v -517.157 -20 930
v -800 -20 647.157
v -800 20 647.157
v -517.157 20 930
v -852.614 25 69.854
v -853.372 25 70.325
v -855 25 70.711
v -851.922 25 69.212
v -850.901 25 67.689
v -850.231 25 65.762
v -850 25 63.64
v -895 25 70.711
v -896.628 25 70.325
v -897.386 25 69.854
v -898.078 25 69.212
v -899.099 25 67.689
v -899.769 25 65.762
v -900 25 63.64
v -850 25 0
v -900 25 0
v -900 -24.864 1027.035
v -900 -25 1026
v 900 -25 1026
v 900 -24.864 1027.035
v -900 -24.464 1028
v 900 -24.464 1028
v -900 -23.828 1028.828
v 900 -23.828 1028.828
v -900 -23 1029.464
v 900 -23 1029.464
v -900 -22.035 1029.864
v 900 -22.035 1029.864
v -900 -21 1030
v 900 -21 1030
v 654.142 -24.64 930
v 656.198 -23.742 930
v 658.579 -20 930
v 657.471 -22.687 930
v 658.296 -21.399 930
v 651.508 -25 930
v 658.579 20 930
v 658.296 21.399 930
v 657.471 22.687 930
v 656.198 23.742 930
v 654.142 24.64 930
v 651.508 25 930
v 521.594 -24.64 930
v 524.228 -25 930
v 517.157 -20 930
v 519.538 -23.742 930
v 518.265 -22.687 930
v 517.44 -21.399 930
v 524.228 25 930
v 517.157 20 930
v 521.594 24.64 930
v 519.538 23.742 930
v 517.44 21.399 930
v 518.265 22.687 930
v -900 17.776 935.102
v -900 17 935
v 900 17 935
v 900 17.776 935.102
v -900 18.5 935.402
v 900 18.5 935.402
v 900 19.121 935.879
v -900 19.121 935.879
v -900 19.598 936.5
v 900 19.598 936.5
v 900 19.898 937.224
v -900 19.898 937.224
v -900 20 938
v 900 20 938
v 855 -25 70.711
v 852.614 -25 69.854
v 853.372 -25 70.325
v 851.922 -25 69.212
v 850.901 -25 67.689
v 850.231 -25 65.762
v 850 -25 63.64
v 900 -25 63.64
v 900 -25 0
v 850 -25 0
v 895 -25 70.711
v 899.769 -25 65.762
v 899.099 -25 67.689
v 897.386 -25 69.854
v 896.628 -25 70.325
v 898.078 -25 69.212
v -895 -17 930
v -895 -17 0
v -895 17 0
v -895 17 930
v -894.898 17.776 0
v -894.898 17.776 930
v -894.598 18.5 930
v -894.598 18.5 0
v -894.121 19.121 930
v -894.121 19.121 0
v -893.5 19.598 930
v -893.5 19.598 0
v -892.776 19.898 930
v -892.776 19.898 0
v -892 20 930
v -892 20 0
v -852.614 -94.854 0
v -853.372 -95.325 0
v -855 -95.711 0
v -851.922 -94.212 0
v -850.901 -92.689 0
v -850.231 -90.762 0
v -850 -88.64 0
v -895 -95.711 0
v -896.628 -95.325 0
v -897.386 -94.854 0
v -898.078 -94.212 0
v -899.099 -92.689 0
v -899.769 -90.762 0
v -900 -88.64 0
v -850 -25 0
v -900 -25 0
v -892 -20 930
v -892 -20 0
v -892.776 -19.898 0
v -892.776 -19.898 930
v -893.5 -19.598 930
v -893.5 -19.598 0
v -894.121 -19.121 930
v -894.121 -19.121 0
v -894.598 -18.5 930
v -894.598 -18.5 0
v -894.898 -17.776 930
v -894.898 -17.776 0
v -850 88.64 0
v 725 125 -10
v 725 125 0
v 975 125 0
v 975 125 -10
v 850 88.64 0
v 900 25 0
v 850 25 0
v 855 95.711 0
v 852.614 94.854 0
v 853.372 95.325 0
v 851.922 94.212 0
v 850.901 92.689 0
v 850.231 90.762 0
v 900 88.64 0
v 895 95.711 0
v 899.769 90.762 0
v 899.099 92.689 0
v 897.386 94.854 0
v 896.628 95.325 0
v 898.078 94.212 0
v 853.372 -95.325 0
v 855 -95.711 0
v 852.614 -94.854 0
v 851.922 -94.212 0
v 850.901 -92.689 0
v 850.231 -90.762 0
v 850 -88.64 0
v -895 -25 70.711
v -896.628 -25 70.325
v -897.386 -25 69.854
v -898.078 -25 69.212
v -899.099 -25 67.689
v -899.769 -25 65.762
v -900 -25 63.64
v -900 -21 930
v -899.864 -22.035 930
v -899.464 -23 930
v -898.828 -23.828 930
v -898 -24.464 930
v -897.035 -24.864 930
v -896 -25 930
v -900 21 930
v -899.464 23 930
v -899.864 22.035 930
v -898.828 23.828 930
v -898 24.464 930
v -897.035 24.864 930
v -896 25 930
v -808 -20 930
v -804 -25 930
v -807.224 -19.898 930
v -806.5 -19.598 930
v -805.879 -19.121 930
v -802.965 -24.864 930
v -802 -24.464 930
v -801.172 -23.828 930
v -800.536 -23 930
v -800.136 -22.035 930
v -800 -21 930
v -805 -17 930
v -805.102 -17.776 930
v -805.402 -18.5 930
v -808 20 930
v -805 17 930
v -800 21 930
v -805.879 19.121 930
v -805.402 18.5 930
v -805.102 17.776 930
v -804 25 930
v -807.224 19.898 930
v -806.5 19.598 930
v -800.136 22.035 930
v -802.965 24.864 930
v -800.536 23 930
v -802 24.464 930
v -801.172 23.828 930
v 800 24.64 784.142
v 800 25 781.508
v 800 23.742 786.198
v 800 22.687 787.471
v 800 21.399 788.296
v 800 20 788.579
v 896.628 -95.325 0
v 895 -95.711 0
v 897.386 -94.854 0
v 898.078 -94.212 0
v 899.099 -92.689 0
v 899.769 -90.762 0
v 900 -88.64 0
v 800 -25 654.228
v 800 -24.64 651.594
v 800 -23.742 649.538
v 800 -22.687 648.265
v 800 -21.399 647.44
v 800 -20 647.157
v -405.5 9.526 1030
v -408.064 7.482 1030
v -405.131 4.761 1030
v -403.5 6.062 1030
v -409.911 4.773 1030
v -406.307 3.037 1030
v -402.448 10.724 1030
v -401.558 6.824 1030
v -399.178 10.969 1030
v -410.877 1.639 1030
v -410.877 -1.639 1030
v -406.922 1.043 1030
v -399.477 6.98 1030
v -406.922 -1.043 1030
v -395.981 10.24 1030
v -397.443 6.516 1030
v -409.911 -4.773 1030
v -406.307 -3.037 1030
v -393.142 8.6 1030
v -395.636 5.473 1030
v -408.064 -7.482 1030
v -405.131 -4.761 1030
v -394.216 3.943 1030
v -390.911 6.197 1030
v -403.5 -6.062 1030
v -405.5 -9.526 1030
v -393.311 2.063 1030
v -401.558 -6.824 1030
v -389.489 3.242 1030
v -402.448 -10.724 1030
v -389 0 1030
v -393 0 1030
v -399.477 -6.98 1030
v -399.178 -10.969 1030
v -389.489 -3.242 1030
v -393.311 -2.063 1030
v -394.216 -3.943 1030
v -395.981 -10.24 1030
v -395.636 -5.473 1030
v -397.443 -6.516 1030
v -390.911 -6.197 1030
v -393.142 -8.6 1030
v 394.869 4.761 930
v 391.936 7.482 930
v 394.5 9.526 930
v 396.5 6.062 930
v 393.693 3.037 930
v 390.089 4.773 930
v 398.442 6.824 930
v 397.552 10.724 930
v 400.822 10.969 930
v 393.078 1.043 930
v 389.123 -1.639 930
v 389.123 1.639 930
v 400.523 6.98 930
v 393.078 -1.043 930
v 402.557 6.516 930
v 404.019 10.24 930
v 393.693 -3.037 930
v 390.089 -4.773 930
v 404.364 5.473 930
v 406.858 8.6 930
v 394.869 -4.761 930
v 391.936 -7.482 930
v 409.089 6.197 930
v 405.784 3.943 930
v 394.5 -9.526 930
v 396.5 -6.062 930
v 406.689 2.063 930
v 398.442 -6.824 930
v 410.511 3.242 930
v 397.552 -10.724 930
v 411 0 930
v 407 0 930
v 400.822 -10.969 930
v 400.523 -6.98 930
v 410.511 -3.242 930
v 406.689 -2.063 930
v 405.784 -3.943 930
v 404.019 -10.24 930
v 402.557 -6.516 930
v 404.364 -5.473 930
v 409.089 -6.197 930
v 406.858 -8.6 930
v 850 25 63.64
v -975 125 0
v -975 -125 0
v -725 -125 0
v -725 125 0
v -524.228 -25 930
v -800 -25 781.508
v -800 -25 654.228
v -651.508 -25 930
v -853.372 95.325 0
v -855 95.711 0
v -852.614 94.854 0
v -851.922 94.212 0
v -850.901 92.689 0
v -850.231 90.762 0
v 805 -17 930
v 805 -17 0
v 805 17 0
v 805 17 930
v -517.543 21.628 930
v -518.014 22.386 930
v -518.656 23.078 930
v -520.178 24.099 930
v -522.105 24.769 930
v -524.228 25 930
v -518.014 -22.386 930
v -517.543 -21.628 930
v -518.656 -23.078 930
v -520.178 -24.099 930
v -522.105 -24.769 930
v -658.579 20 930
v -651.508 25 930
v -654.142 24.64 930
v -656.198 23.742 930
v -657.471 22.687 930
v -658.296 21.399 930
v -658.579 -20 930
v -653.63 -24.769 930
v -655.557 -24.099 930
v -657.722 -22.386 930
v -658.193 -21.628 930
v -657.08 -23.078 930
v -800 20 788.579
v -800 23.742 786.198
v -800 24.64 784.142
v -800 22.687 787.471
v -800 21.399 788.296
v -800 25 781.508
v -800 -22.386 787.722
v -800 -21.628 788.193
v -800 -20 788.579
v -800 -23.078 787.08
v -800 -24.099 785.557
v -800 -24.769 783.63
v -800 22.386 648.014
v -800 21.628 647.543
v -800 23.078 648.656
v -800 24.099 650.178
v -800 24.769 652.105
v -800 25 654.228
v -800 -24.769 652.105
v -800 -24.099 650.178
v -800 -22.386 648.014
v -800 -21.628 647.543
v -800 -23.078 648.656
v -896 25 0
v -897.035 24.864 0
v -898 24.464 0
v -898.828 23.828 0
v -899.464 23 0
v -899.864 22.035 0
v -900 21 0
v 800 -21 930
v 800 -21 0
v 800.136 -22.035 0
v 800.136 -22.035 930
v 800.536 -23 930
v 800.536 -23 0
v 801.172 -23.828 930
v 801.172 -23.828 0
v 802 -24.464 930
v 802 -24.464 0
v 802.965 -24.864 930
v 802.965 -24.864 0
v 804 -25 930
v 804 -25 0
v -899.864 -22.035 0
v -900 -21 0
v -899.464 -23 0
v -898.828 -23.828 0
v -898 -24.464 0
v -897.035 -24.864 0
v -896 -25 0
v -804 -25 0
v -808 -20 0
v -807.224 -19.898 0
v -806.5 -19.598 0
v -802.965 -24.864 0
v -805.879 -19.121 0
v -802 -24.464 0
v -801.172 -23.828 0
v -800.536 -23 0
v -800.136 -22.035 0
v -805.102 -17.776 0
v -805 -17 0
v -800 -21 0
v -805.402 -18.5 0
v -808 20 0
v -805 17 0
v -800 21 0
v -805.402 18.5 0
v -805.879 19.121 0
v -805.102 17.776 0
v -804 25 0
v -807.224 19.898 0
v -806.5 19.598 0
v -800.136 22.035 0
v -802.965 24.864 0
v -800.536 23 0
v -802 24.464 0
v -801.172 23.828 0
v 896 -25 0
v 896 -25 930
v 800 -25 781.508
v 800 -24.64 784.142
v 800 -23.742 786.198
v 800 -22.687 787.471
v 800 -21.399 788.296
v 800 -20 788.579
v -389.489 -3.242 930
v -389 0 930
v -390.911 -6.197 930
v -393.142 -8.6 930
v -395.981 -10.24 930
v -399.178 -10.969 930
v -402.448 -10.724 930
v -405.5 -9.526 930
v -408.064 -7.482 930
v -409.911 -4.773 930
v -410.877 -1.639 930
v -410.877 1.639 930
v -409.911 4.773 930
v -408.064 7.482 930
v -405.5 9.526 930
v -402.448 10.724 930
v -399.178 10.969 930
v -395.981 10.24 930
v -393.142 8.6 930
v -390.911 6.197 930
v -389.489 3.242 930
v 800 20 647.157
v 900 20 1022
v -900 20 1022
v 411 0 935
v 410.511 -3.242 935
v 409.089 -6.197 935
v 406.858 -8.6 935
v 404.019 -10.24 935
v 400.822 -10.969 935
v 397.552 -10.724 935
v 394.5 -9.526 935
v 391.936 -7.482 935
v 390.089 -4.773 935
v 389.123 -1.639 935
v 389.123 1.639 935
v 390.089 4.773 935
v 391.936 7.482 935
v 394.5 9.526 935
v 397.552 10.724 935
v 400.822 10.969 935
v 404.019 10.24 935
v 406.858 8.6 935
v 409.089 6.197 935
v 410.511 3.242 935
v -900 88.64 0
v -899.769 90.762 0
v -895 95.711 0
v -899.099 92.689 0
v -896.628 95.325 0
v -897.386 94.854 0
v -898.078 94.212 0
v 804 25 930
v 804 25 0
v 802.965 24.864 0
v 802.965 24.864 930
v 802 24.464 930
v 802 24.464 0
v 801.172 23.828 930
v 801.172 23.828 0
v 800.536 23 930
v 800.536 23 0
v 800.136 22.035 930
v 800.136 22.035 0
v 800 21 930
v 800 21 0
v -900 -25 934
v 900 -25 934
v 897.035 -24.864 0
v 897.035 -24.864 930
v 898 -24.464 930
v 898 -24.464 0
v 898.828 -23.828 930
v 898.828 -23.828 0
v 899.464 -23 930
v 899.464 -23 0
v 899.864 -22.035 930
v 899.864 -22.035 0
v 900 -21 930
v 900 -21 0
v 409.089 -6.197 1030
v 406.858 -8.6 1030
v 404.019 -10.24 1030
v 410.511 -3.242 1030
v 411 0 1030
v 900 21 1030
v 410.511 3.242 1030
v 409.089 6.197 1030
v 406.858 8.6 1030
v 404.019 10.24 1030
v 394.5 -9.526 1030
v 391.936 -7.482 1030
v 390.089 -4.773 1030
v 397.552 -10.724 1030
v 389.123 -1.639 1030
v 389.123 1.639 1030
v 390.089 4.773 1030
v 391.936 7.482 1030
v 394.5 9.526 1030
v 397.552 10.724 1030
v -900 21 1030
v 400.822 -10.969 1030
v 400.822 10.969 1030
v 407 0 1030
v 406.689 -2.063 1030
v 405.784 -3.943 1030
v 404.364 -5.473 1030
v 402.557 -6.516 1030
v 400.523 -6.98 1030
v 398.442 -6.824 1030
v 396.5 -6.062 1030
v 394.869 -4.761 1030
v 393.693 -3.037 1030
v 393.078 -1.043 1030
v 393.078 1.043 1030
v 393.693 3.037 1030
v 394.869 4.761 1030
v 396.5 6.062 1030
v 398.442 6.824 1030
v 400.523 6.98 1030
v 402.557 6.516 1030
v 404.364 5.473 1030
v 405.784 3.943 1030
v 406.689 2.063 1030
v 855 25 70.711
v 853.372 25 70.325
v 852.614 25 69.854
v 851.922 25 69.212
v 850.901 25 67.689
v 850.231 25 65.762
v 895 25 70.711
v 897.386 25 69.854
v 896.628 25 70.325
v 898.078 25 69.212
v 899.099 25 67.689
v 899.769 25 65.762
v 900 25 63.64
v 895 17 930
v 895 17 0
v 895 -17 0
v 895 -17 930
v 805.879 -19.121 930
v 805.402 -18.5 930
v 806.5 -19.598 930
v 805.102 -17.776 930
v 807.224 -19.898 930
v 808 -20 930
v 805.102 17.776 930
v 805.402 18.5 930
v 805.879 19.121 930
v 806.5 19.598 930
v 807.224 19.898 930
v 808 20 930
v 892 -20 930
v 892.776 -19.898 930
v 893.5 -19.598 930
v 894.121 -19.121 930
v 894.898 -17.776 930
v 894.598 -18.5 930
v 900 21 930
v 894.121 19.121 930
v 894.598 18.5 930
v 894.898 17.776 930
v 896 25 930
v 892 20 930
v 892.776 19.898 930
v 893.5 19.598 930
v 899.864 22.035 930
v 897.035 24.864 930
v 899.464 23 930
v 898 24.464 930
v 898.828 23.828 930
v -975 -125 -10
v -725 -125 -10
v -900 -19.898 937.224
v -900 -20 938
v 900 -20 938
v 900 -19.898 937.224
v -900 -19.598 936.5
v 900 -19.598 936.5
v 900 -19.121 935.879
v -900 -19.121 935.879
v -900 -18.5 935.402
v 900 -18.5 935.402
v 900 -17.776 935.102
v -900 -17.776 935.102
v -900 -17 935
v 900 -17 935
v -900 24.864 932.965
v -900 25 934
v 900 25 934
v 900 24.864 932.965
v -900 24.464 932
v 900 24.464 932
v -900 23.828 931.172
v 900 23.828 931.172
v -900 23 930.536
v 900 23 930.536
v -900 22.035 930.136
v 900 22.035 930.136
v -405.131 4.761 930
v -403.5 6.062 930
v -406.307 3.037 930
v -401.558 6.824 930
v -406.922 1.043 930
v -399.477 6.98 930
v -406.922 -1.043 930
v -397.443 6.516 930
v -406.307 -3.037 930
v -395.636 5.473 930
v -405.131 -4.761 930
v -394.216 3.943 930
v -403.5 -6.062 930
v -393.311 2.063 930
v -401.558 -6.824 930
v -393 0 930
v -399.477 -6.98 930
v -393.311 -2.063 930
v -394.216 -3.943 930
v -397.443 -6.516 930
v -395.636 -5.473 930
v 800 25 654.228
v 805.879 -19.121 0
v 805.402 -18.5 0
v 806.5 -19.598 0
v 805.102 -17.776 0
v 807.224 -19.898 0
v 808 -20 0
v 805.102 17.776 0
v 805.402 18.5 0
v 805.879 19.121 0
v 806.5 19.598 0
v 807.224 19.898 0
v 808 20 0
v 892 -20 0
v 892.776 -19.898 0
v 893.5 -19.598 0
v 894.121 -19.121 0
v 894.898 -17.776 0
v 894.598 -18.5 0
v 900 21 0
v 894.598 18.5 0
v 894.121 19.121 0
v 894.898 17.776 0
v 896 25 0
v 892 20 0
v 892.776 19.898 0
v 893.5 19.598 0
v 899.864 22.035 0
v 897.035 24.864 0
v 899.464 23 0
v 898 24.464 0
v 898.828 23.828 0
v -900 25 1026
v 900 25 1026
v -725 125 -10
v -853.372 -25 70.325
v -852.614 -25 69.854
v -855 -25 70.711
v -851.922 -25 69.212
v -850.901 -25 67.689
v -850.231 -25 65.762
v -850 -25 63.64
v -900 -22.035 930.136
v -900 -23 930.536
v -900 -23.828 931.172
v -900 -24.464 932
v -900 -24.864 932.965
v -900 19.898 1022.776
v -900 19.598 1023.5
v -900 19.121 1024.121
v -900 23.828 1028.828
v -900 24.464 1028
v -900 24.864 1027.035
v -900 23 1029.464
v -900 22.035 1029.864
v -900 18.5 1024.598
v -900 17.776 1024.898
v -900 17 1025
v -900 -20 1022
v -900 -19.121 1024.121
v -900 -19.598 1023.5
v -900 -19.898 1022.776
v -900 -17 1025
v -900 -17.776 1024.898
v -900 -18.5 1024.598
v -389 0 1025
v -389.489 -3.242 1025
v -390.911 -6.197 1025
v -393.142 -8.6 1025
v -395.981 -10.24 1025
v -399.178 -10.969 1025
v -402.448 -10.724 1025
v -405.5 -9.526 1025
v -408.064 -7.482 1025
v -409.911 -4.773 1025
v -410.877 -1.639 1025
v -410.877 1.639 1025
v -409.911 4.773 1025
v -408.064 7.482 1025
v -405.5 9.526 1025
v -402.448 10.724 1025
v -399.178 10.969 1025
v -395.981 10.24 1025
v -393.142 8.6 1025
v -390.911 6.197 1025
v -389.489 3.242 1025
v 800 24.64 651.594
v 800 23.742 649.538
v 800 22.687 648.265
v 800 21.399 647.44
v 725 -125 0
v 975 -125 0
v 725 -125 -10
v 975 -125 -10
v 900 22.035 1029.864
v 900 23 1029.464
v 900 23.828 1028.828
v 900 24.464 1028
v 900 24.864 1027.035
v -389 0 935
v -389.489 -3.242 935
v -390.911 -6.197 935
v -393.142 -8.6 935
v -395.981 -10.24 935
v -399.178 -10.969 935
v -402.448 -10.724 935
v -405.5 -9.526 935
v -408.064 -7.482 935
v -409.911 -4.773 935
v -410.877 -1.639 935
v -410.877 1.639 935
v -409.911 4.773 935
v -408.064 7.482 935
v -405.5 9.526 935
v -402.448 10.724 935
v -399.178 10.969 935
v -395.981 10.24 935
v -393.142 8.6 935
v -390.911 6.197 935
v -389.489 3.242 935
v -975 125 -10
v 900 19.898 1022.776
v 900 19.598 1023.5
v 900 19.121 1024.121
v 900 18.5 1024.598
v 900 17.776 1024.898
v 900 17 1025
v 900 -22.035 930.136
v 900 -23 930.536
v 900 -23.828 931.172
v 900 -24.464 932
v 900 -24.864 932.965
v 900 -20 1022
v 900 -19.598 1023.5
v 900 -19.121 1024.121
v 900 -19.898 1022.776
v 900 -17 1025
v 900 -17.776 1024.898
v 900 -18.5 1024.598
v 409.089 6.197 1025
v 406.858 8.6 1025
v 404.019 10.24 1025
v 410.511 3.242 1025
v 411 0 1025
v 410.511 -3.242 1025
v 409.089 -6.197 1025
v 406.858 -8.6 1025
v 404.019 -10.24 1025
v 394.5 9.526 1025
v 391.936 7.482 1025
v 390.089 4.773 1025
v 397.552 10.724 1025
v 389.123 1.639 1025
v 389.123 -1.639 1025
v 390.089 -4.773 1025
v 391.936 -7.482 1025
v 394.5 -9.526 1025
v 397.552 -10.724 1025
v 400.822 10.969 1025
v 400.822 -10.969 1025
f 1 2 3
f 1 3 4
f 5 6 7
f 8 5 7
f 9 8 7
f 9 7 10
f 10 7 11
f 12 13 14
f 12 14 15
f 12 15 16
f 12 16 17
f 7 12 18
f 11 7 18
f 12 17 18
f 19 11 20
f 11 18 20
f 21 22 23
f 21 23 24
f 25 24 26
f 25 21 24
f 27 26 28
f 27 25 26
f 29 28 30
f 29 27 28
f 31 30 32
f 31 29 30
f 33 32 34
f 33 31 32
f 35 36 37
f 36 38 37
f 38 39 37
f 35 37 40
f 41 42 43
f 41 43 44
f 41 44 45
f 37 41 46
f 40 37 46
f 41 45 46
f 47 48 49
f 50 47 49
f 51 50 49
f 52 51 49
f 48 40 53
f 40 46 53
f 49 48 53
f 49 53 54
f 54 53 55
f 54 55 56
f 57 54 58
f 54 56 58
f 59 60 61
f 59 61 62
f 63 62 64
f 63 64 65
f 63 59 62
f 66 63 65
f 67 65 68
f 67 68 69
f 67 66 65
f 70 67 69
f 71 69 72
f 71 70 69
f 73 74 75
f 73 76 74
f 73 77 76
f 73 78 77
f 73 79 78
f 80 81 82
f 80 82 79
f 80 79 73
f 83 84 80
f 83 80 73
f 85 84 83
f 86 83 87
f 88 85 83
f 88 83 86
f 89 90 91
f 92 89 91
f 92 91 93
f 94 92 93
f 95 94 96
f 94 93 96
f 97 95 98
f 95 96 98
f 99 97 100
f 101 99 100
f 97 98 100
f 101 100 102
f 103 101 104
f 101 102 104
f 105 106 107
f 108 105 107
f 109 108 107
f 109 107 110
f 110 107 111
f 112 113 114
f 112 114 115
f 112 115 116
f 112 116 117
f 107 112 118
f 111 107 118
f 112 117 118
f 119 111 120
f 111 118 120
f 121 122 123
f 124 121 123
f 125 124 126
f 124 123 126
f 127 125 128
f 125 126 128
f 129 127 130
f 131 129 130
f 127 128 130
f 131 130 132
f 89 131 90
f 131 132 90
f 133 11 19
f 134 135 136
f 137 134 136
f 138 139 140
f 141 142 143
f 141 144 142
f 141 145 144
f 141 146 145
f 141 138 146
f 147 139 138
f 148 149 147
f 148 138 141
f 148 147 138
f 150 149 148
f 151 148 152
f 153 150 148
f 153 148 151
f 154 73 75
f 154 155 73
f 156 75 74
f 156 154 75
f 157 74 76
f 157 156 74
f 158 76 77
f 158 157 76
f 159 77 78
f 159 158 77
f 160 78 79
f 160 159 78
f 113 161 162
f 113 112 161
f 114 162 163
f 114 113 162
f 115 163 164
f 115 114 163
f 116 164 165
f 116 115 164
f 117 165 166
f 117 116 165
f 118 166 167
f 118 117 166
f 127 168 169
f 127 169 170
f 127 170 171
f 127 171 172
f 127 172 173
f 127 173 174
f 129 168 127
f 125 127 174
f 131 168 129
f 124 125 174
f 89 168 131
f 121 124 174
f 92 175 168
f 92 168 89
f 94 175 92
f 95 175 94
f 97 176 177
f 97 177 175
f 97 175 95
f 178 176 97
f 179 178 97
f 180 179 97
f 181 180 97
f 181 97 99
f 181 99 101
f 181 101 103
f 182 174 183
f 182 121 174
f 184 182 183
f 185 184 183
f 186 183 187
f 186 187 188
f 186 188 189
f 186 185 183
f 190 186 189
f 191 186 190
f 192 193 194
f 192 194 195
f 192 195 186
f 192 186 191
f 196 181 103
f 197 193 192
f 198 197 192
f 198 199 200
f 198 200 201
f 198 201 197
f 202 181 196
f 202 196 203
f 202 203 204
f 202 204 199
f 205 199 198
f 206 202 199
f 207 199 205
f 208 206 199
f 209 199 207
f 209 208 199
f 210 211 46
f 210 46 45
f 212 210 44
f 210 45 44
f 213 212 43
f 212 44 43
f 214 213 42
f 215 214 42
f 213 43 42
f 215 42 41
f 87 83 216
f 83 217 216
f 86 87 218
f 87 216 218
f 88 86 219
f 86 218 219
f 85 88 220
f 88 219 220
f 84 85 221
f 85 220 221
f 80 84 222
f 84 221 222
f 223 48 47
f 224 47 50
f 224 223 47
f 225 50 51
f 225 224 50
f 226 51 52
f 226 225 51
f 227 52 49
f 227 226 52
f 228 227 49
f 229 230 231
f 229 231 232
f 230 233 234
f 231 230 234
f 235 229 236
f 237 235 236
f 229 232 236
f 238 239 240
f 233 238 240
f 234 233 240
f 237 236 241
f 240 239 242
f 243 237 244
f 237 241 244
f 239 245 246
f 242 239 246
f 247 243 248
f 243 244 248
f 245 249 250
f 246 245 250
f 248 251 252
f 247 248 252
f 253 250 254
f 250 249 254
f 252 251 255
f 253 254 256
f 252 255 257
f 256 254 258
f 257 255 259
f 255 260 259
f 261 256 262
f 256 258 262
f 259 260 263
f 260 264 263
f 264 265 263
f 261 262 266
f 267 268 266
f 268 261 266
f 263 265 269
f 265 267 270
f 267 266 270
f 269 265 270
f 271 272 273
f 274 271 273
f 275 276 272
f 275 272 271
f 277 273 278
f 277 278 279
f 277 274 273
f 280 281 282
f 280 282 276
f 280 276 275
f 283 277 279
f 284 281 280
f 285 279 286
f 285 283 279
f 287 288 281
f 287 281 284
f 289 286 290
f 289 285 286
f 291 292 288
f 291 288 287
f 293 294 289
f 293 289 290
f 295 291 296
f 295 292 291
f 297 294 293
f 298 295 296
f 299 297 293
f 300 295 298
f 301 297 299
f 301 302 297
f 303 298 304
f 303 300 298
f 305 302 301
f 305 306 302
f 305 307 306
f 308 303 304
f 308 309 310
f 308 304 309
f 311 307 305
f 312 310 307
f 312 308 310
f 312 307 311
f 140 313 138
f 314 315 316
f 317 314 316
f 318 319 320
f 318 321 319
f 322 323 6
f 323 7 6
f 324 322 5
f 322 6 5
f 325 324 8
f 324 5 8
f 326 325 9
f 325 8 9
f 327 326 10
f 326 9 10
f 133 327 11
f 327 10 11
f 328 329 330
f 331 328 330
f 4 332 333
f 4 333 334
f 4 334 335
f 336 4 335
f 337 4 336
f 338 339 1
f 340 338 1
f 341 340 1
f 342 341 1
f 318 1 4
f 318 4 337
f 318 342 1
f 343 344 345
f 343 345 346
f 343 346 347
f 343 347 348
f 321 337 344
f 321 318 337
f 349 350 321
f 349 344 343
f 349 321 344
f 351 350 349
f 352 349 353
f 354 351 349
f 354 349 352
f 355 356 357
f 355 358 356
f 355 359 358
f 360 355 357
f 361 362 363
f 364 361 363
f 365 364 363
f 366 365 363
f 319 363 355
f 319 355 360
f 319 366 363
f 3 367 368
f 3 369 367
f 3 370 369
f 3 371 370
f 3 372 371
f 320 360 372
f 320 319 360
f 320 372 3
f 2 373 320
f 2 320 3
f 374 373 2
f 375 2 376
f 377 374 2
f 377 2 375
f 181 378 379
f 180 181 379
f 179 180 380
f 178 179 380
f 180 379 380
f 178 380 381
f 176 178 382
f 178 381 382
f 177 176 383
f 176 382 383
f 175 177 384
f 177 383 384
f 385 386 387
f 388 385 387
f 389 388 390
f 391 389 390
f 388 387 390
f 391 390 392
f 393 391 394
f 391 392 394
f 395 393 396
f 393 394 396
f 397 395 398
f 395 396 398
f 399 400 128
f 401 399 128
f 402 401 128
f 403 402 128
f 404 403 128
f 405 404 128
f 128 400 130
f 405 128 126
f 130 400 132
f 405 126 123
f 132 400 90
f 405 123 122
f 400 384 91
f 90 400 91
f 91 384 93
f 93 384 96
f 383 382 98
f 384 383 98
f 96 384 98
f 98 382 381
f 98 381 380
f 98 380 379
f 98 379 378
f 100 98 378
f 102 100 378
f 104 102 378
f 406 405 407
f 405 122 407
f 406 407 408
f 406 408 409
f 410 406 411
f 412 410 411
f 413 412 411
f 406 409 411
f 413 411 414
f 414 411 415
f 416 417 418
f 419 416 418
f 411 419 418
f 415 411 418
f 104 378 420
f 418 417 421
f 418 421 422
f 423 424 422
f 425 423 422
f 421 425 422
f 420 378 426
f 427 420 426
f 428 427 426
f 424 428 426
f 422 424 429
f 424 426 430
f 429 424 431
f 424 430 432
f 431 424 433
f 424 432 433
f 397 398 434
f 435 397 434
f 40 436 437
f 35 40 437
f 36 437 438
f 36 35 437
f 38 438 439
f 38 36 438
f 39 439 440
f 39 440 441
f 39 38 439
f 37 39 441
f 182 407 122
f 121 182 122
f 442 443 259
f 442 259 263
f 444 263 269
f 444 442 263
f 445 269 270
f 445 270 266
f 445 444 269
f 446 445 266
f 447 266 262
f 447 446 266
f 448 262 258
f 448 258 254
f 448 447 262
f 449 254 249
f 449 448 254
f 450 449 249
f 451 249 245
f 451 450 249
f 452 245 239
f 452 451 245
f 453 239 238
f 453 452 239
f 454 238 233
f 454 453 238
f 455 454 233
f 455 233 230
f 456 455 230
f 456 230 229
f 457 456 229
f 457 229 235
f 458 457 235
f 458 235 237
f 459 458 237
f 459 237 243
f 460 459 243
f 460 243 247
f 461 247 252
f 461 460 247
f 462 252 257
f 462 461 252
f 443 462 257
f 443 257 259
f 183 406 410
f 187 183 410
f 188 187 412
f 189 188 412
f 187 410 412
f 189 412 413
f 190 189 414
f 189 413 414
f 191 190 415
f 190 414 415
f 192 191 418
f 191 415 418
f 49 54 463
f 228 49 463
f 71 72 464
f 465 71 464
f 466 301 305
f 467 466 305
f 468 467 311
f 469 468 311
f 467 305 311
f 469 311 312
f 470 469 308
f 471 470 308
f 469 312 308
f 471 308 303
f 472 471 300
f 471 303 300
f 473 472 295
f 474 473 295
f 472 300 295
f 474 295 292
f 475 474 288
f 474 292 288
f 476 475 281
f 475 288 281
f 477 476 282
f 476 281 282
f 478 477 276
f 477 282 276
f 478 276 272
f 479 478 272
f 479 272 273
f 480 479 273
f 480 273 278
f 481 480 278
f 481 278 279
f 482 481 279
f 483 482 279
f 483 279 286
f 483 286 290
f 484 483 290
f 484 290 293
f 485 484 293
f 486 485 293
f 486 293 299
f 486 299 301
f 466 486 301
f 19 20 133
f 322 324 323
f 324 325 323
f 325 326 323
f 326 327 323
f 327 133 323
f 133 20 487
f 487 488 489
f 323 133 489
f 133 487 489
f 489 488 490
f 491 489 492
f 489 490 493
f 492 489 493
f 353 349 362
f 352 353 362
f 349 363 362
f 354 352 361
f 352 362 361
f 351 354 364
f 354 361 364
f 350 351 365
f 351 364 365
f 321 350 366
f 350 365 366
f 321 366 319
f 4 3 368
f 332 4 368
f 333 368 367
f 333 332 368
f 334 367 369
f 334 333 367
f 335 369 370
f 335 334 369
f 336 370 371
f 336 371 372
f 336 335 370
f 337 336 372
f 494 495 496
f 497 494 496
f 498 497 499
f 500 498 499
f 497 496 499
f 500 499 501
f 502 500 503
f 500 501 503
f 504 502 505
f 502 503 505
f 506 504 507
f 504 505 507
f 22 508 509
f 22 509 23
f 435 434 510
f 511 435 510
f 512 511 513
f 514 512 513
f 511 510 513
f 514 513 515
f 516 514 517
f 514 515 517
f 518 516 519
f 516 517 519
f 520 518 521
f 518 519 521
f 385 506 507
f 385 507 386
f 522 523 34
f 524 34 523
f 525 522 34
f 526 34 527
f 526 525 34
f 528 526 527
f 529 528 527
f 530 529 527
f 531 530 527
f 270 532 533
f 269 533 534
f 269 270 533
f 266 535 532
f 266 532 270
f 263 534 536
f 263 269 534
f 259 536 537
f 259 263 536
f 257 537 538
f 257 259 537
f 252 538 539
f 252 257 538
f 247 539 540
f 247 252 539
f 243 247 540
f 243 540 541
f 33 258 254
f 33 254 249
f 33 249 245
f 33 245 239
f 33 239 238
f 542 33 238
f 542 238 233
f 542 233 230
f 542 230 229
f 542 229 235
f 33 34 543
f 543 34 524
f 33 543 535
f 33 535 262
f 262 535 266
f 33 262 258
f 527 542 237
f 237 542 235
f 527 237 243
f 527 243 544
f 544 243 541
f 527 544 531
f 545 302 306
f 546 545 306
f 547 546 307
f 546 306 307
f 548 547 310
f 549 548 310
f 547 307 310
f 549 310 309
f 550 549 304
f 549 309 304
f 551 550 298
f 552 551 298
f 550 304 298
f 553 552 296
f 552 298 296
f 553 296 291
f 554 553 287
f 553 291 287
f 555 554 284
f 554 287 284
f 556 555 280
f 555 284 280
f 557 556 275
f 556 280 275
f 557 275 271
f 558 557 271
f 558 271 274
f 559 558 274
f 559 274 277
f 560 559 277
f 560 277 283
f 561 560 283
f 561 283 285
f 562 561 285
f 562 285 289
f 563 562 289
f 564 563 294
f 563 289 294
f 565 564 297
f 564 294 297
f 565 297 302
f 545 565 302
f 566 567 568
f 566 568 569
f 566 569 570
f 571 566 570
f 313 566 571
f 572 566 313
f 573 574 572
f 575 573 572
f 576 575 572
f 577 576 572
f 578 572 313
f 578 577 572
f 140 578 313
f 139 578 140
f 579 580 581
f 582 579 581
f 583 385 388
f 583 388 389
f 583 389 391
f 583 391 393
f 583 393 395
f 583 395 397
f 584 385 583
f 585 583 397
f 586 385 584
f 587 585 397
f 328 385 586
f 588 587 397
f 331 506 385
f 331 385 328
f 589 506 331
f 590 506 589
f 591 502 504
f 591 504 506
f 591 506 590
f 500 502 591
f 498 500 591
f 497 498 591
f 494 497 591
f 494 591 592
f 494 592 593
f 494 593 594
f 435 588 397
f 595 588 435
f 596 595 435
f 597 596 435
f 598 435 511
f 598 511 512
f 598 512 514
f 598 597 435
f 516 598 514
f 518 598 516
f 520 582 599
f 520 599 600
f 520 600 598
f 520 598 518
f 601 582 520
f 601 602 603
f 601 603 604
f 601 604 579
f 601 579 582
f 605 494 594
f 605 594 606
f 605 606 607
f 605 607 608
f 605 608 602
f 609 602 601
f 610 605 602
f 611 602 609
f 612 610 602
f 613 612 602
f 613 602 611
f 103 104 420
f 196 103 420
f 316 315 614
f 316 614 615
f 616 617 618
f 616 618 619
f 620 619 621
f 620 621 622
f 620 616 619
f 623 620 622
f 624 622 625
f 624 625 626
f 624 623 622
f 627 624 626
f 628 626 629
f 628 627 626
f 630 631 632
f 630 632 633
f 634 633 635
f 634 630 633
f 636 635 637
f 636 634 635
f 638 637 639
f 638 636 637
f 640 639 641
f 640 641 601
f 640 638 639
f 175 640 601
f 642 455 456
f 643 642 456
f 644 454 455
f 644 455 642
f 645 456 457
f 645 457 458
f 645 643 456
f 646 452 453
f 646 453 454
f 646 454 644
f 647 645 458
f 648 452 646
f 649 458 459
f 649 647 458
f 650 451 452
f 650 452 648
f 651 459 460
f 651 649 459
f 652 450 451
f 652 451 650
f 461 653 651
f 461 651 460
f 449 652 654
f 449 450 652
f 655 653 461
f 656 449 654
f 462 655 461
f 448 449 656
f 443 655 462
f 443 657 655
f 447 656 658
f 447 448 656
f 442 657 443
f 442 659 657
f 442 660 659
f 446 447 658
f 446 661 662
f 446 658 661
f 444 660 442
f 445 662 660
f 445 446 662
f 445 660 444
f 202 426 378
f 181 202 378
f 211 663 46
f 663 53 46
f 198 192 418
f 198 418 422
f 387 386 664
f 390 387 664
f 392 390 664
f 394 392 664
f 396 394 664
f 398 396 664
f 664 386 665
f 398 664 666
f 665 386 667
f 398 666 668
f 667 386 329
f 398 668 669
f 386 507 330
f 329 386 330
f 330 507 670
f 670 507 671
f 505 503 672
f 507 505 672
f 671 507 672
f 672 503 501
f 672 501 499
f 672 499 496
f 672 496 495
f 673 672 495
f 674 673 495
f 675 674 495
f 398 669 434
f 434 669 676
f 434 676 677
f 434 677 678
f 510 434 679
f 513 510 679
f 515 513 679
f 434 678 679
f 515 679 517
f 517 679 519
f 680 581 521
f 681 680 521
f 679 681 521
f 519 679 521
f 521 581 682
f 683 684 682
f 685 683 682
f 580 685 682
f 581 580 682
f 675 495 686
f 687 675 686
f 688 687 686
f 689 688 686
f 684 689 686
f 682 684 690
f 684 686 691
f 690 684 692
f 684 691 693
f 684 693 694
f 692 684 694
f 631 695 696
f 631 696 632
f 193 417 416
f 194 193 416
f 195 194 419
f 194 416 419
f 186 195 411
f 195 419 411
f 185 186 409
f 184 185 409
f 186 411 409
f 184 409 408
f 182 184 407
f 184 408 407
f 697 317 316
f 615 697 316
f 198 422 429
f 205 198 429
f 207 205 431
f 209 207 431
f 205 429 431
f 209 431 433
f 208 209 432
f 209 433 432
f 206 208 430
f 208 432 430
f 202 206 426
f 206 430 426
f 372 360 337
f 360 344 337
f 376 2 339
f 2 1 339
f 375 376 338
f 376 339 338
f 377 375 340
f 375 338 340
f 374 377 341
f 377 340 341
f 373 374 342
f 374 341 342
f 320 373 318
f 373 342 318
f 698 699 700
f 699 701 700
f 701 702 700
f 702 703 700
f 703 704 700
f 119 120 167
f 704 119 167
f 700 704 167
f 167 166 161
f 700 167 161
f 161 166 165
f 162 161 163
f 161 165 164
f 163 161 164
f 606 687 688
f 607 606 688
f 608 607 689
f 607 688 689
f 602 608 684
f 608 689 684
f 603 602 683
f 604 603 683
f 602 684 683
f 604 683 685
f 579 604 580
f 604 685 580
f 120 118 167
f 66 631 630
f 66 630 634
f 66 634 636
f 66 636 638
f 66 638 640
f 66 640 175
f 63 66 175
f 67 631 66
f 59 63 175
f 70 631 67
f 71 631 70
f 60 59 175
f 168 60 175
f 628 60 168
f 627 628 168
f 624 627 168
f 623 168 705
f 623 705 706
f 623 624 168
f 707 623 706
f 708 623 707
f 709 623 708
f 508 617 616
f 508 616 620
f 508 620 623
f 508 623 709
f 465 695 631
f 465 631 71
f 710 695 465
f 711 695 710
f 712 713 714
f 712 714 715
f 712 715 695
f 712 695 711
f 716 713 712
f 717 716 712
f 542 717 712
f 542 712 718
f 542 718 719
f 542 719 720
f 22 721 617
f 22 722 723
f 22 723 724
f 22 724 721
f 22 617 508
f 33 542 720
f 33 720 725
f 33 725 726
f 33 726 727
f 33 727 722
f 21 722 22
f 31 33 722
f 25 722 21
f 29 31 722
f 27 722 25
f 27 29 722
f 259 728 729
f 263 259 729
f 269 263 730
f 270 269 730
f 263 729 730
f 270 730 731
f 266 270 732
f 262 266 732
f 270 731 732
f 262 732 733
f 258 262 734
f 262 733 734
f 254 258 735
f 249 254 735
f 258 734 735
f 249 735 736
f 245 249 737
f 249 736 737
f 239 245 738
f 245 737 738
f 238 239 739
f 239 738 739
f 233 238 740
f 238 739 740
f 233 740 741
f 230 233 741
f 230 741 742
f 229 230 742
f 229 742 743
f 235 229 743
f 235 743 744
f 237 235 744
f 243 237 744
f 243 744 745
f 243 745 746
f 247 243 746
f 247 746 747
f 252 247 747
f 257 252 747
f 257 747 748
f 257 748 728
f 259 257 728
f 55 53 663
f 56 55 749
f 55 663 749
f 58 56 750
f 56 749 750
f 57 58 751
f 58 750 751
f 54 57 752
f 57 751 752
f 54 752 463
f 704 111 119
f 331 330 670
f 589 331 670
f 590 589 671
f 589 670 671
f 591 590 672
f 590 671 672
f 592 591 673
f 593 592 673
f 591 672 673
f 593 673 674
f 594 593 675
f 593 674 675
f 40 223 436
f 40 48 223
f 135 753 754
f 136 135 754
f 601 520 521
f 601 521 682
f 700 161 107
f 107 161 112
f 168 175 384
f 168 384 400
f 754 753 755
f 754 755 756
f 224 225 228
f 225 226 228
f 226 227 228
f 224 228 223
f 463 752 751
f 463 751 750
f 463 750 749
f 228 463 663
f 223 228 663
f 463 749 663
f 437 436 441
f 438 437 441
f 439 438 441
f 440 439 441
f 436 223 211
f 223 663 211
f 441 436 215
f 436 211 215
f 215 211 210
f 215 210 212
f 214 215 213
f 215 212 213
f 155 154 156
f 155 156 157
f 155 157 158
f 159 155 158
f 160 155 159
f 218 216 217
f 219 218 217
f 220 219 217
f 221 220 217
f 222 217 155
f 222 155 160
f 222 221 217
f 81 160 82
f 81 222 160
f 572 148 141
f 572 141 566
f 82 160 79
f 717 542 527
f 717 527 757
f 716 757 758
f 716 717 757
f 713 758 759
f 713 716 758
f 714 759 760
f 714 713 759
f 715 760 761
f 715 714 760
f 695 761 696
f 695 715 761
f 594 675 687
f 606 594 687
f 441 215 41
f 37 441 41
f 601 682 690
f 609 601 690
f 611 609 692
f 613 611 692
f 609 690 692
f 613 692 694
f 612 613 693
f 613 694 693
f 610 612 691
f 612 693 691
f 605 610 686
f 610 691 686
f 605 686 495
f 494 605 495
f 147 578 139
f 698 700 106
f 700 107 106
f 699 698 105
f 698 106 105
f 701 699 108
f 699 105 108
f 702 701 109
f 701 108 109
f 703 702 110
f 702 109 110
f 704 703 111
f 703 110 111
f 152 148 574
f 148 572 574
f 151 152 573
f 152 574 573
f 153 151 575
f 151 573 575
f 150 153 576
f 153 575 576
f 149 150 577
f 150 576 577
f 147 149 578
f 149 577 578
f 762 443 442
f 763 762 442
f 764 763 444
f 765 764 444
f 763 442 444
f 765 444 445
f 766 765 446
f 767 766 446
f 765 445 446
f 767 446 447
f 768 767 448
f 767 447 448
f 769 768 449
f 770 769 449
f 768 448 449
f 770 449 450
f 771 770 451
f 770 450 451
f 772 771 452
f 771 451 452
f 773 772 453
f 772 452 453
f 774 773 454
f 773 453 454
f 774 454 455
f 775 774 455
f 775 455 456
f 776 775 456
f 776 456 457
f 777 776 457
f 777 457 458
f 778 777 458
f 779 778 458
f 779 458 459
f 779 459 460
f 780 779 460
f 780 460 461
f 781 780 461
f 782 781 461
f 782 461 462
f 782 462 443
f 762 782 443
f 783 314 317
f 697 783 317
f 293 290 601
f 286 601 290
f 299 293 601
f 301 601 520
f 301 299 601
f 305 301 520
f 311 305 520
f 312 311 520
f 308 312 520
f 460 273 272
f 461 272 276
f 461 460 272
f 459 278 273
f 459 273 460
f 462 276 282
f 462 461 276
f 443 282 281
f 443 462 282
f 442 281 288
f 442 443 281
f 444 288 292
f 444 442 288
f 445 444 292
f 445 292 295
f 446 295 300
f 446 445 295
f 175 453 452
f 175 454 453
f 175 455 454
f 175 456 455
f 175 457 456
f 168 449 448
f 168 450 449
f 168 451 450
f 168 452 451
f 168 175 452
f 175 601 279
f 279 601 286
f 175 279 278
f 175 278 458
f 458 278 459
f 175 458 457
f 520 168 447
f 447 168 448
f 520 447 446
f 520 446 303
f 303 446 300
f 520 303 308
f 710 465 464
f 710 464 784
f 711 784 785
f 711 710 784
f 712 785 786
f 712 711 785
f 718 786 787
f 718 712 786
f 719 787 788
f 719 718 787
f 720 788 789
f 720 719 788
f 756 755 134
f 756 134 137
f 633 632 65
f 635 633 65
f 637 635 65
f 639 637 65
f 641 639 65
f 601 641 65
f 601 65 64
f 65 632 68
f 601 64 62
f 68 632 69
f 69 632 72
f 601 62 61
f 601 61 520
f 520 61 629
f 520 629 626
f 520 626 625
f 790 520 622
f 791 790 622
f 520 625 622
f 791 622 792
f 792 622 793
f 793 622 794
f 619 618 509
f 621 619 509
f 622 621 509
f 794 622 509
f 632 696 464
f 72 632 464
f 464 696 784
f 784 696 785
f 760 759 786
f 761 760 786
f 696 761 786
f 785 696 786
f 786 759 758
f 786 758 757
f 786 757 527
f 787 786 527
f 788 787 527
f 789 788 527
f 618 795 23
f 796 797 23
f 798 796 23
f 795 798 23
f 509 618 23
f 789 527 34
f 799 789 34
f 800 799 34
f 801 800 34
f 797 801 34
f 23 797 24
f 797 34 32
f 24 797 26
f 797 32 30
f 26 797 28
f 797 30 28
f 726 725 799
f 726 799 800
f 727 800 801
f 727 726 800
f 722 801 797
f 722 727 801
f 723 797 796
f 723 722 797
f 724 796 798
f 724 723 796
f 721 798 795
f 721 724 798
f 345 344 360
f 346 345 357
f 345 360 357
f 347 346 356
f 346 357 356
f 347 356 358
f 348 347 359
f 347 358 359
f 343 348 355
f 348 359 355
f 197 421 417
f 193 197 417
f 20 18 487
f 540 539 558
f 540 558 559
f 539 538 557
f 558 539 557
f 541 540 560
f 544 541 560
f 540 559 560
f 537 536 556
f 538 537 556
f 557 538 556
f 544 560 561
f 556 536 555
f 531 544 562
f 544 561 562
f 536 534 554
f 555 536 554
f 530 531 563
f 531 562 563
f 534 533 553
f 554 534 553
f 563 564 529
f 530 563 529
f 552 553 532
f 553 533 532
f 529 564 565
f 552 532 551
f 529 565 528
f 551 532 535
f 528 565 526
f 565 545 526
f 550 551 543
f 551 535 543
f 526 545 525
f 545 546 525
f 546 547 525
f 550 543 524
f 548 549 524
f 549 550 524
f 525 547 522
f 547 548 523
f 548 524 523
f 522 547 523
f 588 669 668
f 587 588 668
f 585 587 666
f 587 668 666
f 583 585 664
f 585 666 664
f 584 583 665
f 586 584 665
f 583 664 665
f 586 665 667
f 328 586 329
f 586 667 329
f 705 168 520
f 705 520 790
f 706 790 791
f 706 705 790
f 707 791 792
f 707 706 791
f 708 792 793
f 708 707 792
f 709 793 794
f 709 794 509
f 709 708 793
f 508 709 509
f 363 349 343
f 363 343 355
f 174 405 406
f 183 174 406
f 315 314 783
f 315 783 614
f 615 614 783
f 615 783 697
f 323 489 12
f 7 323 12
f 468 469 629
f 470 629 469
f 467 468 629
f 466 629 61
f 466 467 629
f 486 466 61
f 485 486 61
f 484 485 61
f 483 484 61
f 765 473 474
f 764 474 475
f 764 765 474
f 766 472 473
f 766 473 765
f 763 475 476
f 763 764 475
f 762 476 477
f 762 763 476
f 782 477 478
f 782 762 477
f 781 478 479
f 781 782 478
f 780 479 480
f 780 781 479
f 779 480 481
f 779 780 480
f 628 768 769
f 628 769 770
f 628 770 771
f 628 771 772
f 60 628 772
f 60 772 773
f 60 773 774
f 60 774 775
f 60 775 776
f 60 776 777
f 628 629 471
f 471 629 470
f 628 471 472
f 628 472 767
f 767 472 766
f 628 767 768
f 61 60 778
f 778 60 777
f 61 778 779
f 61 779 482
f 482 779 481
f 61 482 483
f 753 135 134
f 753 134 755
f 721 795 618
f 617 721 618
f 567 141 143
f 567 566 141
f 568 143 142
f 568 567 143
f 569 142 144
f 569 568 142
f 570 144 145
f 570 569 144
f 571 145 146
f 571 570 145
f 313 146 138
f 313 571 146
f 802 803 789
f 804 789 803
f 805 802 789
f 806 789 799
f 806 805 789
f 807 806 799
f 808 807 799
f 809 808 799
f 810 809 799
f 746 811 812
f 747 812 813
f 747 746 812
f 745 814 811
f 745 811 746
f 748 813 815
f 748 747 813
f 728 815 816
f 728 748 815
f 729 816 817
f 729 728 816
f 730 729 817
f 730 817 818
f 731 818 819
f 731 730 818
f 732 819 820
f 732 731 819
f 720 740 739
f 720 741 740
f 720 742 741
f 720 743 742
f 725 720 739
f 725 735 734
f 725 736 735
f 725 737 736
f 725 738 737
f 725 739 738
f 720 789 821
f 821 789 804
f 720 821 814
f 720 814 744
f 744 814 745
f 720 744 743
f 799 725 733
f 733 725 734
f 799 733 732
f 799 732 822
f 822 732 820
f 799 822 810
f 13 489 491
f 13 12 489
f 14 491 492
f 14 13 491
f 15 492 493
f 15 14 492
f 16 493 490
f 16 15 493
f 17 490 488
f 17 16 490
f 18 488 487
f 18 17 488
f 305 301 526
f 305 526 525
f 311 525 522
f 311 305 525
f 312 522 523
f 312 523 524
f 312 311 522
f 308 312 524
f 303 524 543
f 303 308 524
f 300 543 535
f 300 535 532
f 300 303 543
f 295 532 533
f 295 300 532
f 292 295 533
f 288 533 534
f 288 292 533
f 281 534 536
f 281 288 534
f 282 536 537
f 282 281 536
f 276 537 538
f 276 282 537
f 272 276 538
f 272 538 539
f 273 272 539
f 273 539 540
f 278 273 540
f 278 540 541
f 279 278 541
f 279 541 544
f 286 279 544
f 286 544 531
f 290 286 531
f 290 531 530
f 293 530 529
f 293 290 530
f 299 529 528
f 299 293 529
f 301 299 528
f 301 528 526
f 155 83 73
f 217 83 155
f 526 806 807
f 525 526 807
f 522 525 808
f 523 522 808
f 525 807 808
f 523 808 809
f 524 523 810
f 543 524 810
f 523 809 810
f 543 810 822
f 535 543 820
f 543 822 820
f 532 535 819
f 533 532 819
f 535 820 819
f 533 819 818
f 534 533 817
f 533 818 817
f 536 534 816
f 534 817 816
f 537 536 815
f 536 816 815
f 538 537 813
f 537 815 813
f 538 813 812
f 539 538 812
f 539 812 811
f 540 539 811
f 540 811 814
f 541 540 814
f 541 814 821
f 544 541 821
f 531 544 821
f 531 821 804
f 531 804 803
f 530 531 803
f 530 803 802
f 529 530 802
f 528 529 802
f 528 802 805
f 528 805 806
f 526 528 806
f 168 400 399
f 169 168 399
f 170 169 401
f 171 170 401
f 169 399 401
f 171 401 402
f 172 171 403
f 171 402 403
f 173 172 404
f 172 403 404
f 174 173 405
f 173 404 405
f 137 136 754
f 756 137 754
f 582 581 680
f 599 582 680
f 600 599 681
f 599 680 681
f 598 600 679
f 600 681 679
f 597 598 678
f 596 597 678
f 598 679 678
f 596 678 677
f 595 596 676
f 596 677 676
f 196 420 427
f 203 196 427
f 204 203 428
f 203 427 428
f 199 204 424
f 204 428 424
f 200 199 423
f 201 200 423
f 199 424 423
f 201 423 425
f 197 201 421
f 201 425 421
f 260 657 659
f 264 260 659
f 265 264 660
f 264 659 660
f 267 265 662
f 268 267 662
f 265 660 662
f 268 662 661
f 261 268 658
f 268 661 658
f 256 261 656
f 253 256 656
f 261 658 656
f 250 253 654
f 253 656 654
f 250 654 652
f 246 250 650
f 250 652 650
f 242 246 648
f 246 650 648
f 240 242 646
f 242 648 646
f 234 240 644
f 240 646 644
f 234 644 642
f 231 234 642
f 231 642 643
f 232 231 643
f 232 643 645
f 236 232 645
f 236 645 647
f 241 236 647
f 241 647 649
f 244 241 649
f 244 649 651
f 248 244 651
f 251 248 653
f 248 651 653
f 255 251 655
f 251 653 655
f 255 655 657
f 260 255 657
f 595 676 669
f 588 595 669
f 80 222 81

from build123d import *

# Parameters (mm, degrees)
F1_DEPTH  = 930
F3_DEPTH  = 1800
F5_DEPTH  = 25
F6_R      = 5
F7_W      = 250
F7_H      = 250
F8_DEPTH  = 10
F10_DEPTH = 50
F11_R     = 5
F13_R     = 11
F14_DEPTH = 100
F15_R     = 11
F15_R_2   = 7
F16_DEPTH = 100
F17_R     = 5
F18_R     = 5


with BuildPart() as f1:
    # F0 (on Top) → F1 (new body)
    with BuildSketch(Plane.XY):
        with BuildLine():
            Line((-896, -25), (-804, -25))
            ThreePointArc((-804, -25), (-801.171573, -23.828427), (-800, -21))
            Line((-800, -21), (-800, 21))
            ThreePointArc((-800, 21), (-801.171573, 23.828427), (-804, 25))
            Line((-804, 25), (-896, 25))
            ThreePointArc((-896, 25), (-898.828427, 23.828427), (-900, 21))
            Line((-900, 21), (-900, -21))
            ThreePointArc((-900, -21), (-898.828427, -23.828427), (-896, -25))
        make_face()
        with BuildLine():
            ThreePointArc((-805, -17), (-805.87868, -19.12132), (-808, -20))
            Line((-808, -20), (-892, -20))
            ThreePointArc((-892, -20), (-894.12132, -19.12132), (-895, -17))
            Line((-895, -17), (-895, 17))
            ThreePointArc((-895, 17), (-894.12132, 19.12132), (-892, 20))
            Line((-892, 20), (-808, 20))
            ThreePointArc((-808, 20), (-805.87868, 19.12132), (-805, 17))
            Line((-805, 17), (-805, -17))
        make_face(mode=Mode.SUBTRACT)
        with BuildLine():
            ThreePointArc((804, 25), (801.171573, 23.828427), (800, 21))
            Line((800, 21), (800, -21))
            ThreePointArc((800, -21), (801.171573, -23.828427), (804, -25))
            Line((804, -25), (896, -25))
            ThreePointArc((896, -25), (898.828427, -23.828427), (900, -21))
            Line((900, -21), (900, 21))
            ThreePointArc((900, 21), (898.828427, 23.828427), (896, 25))
            Line((896, 25), (804, 25))
        make_face()
        with BuildLine():
            Line((892, -20), (808, -20))
            ThreePointArc((808, -20), (805.87868, -19.12132), (805, -17))
            Line((805, -17), (805, 17))
            ThreePointArc((805, 17), (805.87868, 19.12132), (808, 20))
            Line((808, 20), (892, 20))
            ThreePointArc((892, 20), (894.12132, 19.12132), (895, 17))
            Line((895, 17), (895, -17))
            ThreePointArc((895, -17), (894.12132, -19.12132), (892, -20))
        make_face(mode=Mode.SUBTRACT)
    extrude(amount=F1_DEPTH)


with BuildPart() as f3:
    # F2 (on face) → F3 (new body)
    with BuildSketch(Plane(origin=(-900, 0, 0), x_dir=(0, -1, 0), z_dir=(-1, 0, 0))):
        with BuildLine():
            Line((-21, 930), (21, 930))
            ThreePointArc((21, 930), (23.828427, 931.171573), (25, 934))
            Line((25, 934), (25, 1026))
            ThreePointArc((25, 1026), (23.828427, 1028.828427), (21, 1030))
            Line((21, 1030), (-21, 1030))
            ThreePointArc((-21, 1030), (-23.828427, 1028.828427), (-25, 1026))
            Line((-25, 1026), (-25, 934))
            ThreePointArc((-25, 934), (-23.828427, 931.171573), (-21, 930))
        make_face()
        with BuildLine():
            ThreePointArc((20, 938), (19.12132, 935.87868), (17, 935))
            Line((17, 935), (-17, 935))
            ThreePointArc((-17, 935), (-19.12132, 935.87868), (-20, 938))
            Line((-20, 938), (-20, 1022))
            ThreePointArc((-20, 1022), (-19.12132, 1024.12132), (-17, 1025))
            Line((-17, 1025), (17, 1025))
            ThreePointArc((17, 1025), (19.12132, 1024.12132), (20, 1022))
            Line((20, 1022), (20, 938))
        make_face(mode=Mode.SUBTRACT)
    extrude(amount=-F3_DEPTH)

    # F13 (on face) → F14 (cut)
    with BuildSketch(Plane(origin=(0, 0, 930), x_dir=(1, 0, 0), z_dir=(0, 0, -1))):
        with Locations((-400, 0)):
            Circle(F13_R)
        with Locations((400, 0)):
            Circle(F13_R)
    extrude(amount=-F14_DEPTH, mode=Mode.SUBTRACT)


with BuildPart() as f5:
    # F4 (on Front) → F5 (new body, symmetric)
    with BuildSketch(Plane.XZ):
        Polygon((800, 647.157288), (800, 788.578644), (658.578644, 930), (517.157288, 930), align=None)
        Polygon((-658.578644, 930), (-800, 788.578644), (-800, 647.157288), (-517.157288, 930), align=None)
    extrude(amount=F5_DEPTH, both=True)

    # F6
    f6_edges = [f5.edges().sort_by_distance(p)[0] for p in [
        (658.578644, 25, 788.578644),
        (658.578644, -25, 788.578644),
        (-658.578644, 25, 788.578644),
        (-658.578644, -25, 788.578644),
    ]]
    fillet(f6_edges, radius=F6_R)

    # F17
    f17_edges = [f5.edges().sort_by_distance(p)[0] for p in [
        (-729.289322, -25, 859.289322),
        (-729.289322, 25, 859.289322),
    ]]
    fillet(f17_edges, radius=F17_R)

    # F18
    f18_edges = [f5.edges().sort_by_distance(p)[0] for p in [
        (729.289322, 25, 859.289322),
        (729.289322, -25, 859.289322),
    ]]
    fillet(f18_edges, radius=F18_R)


with BuildPart() as f8:
    # F7 (on face) → F8 (new body)
    with BuildSketch(Plane(origin=(0, 0, 0), x_dir=(1, 0, 0), z_dir=(0, 0, -1))):
        with Locations((850, 0)):
            Rectangle(F7_W, F7_H)
        with Locations((-850, 0)):
            Rectangle(F7_W, F7_H)
    extrude(amount=F8_DEPTH)


with BuildPart() as f10:
    # F9 (on face) → F10 (new body)
    with BuildSketch(Plane.YZ.offset(900)):
        Polygon((-25, 0), (-25, 70.710678), (-95.710678, 0), align=None)
        Polygon((95.710678, 0), (25, 70.710678), (25, 0), align=None)
    extrude(amount=-F10_DEPTH)

    # F11
    f11_edges = [f10.edges().sort_by_distance(p)[0] for p in [
        (900, 60.355339, 35.355339),
        (850, 60.355339, 35.355339),
        (900, -60.355339, 35.355339),
        (850, -60.355339, 35.355339),
    ]]
    fillet(f11_edges, radius=F11_R)


with BuildPart() as f12_1:
    # F12: instance of F10
    add(f10.part.mirror(Plane.YZ))


with BuildPart() as f16:
    # F15 (on face) → F16 (new body)
    with BuildSketch(Plane(origin=(0, 0, 930), x_dir=(1, 0, 0), z_dir=(0, 0, -1))):
        with Locations((-400, 0)):
            Circle(F15_R)
        with Locations((-400, 0)):
            Circle(F15_R_2, mode=Mode.SUBTRACT)
        with Locations((400, 0)):
            Circle(F15_R)
        with Locations((400, 0)):
            Circle(F15_R_2, mode=Mode.SUBTRACT)
    extrude(amount=-F16_DEPTH)


solid = Compound([f1.part, f3.part, f5.part, f8.part, f10.part, f12_1.part, f16.part])
